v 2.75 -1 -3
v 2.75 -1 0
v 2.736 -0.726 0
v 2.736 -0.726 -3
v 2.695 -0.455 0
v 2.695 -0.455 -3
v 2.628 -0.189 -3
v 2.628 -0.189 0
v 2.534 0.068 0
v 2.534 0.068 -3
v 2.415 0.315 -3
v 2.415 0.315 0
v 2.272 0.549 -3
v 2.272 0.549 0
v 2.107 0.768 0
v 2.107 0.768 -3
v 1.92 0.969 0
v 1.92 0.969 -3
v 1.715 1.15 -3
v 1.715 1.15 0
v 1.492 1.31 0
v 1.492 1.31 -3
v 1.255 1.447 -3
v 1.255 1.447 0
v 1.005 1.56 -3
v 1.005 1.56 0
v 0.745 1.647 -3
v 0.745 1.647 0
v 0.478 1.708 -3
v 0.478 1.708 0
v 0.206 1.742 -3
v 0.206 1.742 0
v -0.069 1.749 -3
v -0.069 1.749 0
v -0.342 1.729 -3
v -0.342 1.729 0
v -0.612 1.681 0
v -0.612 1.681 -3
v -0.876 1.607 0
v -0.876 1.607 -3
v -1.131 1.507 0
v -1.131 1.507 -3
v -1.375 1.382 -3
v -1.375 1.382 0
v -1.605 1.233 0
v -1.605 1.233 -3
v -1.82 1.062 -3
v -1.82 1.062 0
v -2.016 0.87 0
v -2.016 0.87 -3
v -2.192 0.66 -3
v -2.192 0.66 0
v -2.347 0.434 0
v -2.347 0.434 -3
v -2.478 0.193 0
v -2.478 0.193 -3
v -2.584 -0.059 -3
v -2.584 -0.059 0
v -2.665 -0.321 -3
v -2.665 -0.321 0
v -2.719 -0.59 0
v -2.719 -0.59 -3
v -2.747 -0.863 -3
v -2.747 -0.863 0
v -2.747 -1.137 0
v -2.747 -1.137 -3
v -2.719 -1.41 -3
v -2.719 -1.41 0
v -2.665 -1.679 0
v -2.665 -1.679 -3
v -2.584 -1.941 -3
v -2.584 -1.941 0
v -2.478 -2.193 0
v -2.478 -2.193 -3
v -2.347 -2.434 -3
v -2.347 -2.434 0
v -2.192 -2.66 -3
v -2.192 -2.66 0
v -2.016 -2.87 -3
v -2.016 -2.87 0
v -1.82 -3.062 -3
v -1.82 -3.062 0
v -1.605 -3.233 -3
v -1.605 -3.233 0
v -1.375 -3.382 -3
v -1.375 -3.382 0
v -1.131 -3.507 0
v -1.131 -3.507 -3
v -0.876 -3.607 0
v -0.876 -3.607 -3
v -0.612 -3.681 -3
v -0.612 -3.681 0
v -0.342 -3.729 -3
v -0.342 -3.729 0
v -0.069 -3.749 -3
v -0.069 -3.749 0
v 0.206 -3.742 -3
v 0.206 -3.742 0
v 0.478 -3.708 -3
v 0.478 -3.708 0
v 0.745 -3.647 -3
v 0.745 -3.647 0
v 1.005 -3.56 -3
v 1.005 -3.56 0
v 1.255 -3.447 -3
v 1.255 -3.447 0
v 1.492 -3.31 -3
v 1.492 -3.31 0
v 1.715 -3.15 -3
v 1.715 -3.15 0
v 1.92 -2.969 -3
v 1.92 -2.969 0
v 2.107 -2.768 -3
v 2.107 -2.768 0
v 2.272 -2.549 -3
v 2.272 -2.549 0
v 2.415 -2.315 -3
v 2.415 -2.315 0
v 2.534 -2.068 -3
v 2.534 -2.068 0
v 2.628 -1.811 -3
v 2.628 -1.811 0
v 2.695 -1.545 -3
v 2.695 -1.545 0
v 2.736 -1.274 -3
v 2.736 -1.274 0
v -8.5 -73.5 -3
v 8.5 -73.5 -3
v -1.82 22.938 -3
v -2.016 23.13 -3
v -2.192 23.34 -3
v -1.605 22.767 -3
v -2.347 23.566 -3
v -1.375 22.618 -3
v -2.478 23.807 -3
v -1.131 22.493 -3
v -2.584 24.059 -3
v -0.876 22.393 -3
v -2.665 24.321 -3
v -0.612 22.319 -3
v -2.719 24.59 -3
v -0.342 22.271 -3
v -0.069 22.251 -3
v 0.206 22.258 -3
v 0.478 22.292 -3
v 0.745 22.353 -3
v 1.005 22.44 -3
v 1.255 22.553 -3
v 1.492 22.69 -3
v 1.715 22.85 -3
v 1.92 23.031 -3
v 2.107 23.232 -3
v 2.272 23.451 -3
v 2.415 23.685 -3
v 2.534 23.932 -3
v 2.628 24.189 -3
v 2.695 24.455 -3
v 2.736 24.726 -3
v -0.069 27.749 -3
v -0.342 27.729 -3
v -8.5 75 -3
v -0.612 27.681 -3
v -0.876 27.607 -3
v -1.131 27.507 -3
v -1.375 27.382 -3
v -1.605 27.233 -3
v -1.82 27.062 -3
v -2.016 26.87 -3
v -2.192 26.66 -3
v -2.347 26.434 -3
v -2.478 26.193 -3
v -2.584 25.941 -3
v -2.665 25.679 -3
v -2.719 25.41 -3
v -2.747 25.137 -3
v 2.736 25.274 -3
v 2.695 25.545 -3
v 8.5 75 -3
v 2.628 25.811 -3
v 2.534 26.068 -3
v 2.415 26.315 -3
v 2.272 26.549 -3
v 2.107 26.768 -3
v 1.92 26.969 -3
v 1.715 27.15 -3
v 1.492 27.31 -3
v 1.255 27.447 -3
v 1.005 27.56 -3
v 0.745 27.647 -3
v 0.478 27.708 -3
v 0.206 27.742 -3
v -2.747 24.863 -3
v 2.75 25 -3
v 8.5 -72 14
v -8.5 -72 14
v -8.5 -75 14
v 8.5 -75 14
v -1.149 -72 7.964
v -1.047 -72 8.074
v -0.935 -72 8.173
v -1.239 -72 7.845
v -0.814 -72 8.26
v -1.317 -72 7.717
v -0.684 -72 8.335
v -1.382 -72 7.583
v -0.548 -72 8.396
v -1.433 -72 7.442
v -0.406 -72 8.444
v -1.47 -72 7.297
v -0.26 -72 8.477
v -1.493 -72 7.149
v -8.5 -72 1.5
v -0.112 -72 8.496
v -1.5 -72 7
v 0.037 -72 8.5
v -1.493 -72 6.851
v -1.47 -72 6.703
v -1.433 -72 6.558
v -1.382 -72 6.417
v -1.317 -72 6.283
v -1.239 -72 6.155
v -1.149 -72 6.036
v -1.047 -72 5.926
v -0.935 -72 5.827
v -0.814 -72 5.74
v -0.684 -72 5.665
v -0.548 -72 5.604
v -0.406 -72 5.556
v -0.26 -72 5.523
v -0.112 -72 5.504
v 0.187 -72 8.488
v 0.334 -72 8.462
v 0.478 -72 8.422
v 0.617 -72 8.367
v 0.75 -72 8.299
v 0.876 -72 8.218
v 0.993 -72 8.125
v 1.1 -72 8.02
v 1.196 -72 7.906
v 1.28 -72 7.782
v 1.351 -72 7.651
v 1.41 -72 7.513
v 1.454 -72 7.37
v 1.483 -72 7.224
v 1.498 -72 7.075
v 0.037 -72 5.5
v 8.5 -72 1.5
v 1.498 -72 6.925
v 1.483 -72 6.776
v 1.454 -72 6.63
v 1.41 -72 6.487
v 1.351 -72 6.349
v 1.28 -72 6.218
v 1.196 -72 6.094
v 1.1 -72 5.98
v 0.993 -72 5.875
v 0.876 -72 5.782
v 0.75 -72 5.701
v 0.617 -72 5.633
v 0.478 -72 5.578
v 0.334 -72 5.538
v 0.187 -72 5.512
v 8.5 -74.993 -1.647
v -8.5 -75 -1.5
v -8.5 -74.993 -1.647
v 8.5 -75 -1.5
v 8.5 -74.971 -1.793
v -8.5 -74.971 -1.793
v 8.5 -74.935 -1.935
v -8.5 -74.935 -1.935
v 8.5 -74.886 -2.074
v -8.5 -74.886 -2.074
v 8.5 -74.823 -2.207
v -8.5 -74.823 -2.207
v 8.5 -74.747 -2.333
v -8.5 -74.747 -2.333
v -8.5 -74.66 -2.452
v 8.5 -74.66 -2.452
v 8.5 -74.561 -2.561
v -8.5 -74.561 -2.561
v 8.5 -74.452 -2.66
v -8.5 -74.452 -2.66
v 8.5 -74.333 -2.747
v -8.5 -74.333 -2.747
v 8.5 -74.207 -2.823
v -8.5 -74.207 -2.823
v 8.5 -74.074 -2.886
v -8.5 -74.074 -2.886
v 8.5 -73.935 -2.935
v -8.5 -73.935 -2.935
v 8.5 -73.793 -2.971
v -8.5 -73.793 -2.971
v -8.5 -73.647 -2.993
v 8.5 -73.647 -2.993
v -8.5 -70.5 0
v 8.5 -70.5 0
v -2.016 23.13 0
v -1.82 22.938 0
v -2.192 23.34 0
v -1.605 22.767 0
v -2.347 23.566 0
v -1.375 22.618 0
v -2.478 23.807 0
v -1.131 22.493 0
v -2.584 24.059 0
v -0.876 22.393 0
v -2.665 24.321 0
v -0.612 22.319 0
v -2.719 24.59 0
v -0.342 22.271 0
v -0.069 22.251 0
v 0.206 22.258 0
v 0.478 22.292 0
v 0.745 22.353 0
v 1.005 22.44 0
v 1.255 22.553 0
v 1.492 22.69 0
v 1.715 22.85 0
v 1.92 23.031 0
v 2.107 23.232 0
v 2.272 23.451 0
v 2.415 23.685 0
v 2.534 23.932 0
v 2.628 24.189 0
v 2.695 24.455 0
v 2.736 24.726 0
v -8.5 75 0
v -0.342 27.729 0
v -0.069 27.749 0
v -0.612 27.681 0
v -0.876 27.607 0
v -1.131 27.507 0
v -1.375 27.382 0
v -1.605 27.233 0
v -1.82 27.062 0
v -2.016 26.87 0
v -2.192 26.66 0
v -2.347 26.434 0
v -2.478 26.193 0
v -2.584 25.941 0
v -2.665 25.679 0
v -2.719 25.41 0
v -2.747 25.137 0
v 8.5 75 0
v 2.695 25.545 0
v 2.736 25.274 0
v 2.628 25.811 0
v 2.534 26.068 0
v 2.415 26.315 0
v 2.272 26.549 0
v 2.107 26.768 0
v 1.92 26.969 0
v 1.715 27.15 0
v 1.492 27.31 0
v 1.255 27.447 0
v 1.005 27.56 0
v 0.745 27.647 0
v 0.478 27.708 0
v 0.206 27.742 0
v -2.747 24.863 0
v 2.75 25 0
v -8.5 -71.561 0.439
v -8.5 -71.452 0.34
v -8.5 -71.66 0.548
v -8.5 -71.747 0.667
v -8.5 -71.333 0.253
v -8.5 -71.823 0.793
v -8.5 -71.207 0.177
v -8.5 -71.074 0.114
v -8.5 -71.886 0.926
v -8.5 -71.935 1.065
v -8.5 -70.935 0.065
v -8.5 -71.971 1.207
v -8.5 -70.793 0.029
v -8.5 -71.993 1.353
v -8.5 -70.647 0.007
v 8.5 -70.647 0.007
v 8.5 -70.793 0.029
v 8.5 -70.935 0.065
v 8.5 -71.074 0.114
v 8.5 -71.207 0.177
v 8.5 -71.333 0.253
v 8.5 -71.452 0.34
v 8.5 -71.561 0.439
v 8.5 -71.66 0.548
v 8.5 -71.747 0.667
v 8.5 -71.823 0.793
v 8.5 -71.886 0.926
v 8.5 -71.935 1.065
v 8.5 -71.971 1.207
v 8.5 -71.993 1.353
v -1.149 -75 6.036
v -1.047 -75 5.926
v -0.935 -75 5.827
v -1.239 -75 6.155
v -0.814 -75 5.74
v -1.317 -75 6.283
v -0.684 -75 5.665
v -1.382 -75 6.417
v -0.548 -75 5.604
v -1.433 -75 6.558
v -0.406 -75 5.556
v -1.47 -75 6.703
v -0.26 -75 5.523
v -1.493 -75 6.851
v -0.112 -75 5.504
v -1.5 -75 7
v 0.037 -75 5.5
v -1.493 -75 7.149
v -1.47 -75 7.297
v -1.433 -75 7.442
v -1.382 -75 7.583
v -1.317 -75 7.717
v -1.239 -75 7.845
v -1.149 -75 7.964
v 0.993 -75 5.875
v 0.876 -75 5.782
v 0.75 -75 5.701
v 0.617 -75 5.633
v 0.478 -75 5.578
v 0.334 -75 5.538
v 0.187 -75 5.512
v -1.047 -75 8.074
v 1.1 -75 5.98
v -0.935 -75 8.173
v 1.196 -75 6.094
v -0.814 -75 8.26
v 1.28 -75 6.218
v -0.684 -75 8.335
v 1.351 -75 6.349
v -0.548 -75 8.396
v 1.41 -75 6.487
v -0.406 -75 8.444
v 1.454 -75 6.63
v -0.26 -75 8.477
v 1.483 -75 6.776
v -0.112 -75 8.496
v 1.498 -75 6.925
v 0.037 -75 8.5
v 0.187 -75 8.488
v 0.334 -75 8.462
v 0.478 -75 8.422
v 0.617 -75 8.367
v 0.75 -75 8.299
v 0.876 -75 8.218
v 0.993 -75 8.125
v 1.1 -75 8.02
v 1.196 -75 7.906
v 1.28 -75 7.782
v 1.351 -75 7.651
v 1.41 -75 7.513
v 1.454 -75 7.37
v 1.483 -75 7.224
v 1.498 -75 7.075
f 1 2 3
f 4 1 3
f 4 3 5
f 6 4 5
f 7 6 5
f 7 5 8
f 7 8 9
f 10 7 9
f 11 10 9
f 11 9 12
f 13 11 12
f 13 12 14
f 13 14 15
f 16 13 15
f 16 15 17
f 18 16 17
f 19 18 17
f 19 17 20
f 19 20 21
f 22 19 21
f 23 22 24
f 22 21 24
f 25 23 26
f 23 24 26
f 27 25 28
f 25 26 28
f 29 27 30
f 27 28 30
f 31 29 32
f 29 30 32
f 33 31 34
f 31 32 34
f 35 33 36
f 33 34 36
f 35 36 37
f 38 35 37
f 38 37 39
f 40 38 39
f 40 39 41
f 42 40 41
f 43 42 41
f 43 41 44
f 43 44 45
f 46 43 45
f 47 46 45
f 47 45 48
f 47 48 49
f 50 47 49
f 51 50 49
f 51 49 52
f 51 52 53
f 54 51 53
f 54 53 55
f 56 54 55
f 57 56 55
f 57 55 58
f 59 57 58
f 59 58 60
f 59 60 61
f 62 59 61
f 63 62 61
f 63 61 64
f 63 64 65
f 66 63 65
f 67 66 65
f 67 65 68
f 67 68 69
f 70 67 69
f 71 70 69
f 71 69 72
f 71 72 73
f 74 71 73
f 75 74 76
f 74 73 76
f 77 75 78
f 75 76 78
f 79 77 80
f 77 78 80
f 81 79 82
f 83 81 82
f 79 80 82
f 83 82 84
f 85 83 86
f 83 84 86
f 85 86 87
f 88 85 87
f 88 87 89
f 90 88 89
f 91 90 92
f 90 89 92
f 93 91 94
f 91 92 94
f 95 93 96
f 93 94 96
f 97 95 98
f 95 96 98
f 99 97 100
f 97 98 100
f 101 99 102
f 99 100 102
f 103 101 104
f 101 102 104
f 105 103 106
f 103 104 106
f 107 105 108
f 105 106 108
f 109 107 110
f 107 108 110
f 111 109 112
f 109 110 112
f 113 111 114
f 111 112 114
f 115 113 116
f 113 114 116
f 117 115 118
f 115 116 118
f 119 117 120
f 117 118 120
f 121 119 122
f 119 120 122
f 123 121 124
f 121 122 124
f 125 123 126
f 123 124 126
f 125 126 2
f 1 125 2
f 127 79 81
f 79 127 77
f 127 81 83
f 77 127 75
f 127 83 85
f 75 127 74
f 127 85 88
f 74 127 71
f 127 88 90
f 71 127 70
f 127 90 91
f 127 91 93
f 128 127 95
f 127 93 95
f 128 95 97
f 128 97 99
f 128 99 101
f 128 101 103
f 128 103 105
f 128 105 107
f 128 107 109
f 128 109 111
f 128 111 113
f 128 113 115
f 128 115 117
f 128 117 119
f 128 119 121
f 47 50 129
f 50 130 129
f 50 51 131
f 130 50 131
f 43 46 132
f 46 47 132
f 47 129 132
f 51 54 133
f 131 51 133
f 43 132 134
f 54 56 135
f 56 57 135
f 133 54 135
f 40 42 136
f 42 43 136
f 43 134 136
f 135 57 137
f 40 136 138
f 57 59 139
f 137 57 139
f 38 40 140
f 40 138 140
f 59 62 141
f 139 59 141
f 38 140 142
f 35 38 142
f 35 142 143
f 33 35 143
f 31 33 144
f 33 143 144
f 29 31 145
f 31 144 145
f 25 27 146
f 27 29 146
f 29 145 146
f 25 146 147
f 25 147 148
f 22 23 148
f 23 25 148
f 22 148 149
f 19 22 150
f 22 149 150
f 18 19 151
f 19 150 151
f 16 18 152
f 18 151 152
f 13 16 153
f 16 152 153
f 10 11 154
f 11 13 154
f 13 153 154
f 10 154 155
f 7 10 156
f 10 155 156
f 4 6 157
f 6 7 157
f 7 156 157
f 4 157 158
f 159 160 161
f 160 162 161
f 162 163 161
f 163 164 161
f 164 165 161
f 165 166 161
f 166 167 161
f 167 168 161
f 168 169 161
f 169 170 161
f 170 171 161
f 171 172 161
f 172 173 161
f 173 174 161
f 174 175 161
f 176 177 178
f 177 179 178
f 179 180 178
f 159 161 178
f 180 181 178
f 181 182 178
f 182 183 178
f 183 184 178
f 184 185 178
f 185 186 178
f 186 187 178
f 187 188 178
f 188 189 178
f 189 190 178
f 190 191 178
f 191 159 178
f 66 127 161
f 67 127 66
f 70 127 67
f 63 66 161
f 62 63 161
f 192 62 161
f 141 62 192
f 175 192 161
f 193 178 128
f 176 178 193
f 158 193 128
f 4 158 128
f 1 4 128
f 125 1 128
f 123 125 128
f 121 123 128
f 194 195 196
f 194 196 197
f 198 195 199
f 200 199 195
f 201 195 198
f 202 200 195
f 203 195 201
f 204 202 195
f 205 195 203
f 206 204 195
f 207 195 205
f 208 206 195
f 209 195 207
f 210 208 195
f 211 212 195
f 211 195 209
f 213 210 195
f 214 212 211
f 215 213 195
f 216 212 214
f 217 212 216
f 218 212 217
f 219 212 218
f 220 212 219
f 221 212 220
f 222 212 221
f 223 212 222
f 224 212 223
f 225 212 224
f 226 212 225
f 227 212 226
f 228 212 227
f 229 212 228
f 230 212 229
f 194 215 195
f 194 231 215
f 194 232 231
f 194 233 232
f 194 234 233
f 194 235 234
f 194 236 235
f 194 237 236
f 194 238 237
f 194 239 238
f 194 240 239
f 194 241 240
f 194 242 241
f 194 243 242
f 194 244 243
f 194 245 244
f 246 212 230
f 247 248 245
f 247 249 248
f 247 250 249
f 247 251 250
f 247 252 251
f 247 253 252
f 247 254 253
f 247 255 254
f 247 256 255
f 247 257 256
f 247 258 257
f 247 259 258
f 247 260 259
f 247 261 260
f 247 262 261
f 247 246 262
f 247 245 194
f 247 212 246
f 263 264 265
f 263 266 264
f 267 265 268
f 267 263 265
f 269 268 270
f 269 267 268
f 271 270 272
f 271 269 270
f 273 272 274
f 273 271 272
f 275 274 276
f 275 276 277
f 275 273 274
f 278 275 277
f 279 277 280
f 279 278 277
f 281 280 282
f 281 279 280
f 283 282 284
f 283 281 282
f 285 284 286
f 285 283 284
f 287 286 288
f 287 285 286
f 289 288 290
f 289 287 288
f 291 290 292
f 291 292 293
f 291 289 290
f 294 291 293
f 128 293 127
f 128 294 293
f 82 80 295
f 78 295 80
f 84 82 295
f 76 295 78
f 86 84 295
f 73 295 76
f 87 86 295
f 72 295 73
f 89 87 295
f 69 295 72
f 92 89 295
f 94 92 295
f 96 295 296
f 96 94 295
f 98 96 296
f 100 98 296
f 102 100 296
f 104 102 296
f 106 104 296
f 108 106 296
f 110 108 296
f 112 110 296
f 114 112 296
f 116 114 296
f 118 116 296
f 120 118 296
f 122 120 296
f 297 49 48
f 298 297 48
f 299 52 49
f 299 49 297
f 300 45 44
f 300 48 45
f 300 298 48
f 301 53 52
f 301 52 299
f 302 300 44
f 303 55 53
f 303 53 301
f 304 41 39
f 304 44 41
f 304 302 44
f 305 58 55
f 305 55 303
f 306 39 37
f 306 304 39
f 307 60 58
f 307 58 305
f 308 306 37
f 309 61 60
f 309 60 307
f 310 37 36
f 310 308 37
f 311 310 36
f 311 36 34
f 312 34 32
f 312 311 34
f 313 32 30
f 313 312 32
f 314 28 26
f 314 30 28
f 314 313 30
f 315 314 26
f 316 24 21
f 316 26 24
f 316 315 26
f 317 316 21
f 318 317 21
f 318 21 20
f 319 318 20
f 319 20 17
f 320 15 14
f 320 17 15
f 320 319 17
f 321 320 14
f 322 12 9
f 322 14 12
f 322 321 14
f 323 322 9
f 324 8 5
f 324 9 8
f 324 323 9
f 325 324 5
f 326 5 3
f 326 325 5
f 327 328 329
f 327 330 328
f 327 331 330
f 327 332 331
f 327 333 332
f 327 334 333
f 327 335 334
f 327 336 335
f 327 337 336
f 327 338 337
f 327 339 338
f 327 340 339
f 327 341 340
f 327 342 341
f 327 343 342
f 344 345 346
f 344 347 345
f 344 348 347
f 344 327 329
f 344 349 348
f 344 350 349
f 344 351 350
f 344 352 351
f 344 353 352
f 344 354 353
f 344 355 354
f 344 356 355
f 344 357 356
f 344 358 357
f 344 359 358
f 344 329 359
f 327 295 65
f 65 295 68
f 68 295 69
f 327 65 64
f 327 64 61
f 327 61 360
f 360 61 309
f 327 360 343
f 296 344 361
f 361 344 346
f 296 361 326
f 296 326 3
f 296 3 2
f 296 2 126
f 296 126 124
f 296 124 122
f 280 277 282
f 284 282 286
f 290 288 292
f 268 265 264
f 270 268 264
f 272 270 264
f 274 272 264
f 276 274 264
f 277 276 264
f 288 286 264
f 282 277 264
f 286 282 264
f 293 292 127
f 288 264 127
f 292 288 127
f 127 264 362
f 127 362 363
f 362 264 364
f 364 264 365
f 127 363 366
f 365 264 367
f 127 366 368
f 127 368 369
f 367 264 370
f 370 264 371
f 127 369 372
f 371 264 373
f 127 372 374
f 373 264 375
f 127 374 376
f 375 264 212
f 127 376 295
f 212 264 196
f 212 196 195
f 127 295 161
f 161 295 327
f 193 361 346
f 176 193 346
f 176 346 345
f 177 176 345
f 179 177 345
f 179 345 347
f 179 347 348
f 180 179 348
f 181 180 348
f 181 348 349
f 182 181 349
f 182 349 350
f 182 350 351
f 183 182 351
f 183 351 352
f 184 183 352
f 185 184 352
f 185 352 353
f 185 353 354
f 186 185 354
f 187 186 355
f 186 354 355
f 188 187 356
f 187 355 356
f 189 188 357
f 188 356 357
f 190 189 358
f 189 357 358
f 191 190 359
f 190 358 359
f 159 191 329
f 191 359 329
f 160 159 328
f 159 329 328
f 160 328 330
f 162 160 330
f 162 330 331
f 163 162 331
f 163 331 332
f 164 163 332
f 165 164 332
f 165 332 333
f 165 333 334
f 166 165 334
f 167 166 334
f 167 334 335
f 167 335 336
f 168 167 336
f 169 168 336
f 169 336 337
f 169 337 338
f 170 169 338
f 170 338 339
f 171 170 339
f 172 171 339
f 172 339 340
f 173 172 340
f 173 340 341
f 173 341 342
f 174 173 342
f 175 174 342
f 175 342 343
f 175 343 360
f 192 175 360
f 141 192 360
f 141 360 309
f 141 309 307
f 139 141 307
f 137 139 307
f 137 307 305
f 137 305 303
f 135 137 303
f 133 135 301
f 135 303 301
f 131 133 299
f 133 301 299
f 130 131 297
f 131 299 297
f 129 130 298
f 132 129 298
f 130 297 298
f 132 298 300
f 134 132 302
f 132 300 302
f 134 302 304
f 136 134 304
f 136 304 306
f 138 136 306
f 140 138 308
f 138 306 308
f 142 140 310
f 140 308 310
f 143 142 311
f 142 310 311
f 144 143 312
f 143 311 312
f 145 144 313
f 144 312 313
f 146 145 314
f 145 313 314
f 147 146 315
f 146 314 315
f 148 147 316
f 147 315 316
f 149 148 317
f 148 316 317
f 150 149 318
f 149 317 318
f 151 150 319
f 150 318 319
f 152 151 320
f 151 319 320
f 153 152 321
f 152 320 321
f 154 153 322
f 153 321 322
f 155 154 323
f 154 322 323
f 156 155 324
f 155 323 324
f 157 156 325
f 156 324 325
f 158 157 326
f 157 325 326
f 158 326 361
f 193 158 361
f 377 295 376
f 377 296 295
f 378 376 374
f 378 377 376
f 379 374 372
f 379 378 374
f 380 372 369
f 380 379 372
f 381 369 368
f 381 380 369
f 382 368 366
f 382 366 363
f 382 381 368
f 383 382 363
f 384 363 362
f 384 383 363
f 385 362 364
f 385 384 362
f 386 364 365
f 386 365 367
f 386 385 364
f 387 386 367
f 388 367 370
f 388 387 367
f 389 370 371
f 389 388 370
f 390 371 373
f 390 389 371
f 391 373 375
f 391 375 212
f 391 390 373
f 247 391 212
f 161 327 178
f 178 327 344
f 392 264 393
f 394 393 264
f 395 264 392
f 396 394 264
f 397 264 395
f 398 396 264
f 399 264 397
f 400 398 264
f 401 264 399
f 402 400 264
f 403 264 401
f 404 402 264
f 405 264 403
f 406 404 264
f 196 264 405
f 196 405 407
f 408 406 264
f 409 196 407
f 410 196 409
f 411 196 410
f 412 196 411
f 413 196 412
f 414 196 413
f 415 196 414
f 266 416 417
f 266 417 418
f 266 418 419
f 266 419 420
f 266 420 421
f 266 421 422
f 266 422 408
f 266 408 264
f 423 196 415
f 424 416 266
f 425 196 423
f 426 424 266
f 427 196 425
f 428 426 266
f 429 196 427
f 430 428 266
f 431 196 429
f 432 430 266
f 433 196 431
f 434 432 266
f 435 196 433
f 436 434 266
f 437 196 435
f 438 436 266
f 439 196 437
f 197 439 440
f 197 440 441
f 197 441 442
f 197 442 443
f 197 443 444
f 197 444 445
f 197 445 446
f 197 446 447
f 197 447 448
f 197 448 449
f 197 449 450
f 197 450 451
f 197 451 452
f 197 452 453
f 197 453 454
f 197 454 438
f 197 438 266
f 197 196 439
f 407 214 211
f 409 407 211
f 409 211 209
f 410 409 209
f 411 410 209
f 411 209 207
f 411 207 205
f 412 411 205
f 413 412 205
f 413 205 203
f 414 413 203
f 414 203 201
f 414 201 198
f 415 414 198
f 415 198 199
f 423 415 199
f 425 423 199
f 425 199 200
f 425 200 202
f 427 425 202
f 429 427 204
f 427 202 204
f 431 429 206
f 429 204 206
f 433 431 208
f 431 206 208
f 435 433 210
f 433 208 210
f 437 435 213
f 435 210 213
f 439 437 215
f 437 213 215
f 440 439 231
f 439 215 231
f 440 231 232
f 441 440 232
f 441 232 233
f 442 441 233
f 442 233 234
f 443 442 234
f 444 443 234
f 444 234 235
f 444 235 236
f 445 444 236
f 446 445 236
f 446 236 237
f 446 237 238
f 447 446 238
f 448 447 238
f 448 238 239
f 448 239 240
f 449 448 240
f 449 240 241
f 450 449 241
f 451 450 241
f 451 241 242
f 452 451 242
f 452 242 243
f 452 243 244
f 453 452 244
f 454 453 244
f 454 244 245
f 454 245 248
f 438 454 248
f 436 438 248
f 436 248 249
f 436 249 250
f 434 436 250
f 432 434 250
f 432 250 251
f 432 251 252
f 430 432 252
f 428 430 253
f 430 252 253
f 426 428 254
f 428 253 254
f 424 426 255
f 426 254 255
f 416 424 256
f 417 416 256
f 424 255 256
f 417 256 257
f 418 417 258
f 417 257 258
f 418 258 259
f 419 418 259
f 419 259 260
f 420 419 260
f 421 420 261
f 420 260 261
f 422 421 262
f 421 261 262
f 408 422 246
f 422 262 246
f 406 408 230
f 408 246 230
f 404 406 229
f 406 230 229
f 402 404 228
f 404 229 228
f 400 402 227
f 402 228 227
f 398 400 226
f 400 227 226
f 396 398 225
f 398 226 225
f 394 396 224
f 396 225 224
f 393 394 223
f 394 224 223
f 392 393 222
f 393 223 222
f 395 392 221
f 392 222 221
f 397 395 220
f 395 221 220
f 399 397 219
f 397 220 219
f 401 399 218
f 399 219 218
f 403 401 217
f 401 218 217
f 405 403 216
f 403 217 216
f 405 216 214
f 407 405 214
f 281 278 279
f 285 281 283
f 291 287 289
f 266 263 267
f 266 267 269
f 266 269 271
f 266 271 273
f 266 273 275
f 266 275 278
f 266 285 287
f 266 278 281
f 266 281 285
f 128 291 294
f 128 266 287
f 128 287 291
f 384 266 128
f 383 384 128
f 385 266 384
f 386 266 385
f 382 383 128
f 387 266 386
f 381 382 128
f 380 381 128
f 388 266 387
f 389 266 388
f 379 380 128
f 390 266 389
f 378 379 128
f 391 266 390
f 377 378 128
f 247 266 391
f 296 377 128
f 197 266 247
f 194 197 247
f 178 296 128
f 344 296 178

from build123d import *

# Parameters (mm, degrees)
F0_W      = 17
F0_H      = 3
F1_DEPTH  = 14
F0_H_2    = 147
F1_FACE_W = 17
F1_FACE_H = 3
F2_DEPTH  = 3
F3_R      = 1.5
F4_DEPTH  = 25
F5_R      = 2.75
F6_DEPTH  = 25
F7_R      = 1.5


with BuildPart() as f1:
    # F0 (on Top) → F1 (new body)
    with BuildSketch(Plane.XY):
        with Locations((0, -73.5)):
            Rectangle(F0_W, F0_H)
    extrude(amount=F1_DEPTH)

    # F0 (on Top) + F1_face (on face) → F2 (join)
    with BuildSketch(Plane.XY):
        with Locations((0, 1.5)):
            Rectangle(F0_W, F0_H_2)
    with BuildSketch(Plane(origin=(0, -73.5, 0), x_dir=(1, 0, 0), z_dir=(0, 0, -1))):
        Rectangle(F1_FACE_W, F1_FACE_H)
    extrude(amount=-F2_DEPTH, dir=(0, 0, 1))

    # F3 (on face) → F4 (cut)
    with BuildSketch(Plane(origin=(0, -72, 0), x_dir=(-1, 0, 0), z_dir=(0, 1, 0))):
        with Locations((0, 7)):
            Circle(F3_R)
    extrude(amount=-F4_DEPTH, mode=Mode.SUBTRACT)

    # F5 (on face) → F6 (cut)
    with BuildSketch(Plane.XY):
        with Locations((0, -1)):
            Circle(F5_R)
        with Locations((0, 25)):
            Circle(F5_R)
    extrude(amount=-F6_DEPTH, mode=Mode.SUBTRACT)

    # F7
    f7_edges = [f1.edges().sort_by_distance(p)[0] for p in [
        (0, -75, -3),
        (0, -72, 0),
    ]]
    fillet(f7_edges, radius=F7_R)


solid = f1.part
